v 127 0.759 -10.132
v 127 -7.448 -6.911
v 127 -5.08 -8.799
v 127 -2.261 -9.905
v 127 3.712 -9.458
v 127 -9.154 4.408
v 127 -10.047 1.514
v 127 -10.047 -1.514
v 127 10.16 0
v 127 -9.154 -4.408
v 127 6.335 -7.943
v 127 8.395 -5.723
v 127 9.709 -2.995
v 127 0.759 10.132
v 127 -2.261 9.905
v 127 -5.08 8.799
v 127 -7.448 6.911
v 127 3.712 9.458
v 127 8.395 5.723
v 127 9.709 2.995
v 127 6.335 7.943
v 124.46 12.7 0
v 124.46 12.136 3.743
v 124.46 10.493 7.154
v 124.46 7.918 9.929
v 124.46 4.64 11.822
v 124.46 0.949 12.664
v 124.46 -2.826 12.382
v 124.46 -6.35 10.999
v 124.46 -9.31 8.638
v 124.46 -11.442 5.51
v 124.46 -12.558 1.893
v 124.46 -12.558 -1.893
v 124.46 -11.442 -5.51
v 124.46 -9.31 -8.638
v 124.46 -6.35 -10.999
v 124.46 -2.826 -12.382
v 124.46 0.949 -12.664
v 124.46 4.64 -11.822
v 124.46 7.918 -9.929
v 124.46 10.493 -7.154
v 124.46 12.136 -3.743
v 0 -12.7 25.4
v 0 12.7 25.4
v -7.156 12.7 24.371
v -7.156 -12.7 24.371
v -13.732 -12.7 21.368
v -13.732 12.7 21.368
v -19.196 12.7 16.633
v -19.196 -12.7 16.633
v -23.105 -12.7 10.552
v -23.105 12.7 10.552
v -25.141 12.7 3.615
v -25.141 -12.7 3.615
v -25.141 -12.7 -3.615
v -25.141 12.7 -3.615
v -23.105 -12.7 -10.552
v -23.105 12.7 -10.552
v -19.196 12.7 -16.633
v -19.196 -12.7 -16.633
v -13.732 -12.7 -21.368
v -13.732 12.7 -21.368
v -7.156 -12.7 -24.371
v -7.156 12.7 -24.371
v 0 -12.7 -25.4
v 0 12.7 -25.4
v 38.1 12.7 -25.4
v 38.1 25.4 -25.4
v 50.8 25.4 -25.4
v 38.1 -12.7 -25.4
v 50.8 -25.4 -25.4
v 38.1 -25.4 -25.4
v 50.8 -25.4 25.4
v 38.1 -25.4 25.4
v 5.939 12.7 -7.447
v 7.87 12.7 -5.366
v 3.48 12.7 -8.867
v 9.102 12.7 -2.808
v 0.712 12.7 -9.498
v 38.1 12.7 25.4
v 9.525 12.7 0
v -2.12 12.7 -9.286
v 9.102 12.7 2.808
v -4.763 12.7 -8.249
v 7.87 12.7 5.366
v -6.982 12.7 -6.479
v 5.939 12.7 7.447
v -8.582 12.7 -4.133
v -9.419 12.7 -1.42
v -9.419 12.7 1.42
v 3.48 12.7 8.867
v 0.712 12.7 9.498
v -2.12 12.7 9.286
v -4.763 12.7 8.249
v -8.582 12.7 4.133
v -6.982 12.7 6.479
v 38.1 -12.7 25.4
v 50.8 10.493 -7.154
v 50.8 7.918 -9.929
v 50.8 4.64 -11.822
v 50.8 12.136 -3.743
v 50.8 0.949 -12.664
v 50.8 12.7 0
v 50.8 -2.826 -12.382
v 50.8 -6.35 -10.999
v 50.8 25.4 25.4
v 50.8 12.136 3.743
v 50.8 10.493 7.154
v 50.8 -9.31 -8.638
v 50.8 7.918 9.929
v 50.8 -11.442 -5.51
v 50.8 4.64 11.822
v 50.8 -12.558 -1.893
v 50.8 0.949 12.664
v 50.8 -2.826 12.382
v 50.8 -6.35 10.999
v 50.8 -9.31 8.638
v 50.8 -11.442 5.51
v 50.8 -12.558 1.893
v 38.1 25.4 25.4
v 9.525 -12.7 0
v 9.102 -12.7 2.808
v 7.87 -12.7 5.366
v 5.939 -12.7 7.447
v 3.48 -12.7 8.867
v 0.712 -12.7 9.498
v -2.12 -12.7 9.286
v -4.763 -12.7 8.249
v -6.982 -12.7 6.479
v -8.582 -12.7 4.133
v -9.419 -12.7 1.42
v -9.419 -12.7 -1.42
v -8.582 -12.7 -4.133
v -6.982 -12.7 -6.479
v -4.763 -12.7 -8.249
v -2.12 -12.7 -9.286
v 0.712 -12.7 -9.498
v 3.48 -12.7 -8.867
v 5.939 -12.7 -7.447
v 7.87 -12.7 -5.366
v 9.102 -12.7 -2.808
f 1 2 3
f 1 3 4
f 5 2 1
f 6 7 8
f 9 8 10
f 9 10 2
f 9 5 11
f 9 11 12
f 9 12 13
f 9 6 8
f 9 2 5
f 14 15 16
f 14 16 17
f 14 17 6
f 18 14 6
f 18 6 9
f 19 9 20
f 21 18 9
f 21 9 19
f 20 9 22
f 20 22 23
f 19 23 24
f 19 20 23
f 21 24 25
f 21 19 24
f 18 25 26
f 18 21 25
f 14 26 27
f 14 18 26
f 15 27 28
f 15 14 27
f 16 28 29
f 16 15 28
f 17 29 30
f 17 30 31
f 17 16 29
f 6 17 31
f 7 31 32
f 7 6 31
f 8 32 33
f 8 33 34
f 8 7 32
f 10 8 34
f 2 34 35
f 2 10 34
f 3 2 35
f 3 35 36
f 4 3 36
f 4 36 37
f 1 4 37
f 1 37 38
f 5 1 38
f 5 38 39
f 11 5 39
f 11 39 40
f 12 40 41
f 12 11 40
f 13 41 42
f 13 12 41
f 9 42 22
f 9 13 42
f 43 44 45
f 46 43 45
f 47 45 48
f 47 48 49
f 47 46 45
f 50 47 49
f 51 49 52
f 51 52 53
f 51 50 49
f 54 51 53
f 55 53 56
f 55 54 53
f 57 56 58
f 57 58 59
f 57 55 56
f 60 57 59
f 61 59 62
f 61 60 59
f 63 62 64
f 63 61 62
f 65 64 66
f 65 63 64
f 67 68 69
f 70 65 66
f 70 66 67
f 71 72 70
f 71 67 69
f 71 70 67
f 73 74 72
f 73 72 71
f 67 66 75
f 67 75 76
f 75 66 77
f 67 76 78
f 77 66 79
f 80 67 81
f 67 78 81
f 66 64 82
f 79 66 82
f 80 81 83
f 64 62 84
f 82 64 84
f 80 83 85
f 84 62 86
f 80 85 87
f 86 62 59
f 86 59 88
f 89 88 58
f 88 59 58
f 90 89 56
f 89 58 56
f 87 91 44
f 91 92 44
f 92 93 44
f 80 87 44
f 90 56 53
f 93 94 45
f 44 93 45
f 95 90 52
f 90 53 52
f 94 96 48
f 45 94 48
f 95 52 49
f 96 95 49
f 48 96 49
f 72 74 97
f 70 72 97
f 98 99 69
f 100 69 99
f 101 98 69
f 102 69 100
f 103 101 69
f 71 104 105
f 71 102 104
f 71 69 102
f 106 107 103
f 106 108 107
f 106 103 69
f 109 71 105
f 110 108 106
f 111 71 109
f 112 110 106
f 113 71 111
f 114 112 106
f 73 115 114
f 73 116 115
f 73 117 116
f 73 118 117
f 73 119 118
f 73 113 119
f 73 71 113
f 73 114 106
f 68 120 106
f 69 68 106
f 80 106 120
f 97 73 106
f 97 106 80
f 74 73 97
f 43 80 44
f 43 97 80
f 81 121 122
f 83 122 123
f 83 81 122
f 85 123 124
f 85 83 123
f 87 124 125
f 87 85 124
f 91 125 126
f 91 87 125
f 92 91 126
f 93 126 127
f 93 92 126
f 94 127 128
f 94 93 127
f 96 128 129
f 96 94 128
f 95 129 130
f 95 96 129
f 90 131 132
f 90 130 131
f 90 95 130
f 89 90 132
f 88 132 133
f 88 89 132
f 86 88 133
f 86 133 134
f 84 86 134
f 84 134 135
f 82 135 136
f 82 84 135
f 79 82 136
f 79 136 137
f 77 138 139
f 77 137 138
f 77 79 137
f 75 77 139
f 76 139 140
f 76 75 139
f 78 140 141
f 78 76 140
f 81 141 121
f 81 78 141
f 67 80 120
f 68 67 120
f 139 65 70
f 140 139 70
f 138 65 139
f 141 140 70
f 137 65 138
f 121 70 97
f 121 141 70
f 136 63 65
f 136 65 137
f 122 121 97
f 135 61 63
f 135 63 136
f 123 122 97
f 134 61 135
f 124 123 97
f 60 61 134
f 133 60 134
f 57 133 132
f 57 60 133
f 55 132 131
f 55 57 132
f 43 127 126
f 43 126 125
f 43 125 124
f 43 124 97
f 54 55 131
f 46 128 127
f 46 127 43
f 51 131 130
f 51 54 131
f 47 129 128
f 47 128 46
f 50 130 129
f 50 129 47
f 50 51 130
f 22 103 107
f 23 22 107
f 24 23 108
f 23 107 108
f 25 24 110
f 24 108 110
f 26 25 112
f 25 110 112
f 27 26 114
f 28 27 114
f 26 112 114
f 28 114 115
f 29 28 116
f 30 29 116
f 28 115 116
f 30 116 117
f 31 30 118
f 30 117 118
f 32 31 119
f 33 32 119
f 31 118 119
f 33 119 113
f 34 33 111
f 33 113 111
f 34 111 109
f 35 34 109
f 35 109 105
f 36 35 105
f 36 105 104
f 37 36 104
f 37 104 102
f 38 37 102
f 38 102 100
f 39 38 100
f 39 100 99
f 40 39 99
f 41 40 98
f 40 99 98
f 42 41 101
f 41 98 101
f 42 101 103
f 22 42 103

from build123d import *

# Parameters (mm, degrees)
F0_R     = 9.525
F1_DEPTH = 25.4
F2_W     = 12.7
F2_H     = 50.8
F3_DEPTH = 38.1
F4_DEPTH = 25.4
F5_R     = 12.7
F6_DEPTH = 76.2
F7_SIZE2 = 2.54
F7_SIZE  = 2.54


with BuildPart() as f1:
    # F0 (on Front) → F1 (new body, symmetric)
    with BuildSketch(Plane.XZ):
        with BuildLine():
            Line((50.8, 25.4), (0, 25.4))
            ThreePointArc((0, 25.4), (-25.4, 0), (0, -25.4))
            Line((0, -25.4), (50.8, -25.4))
            Line((50.8, -25.4), (50.8, 25.4))
        make_face()
        Circle(F0_R, mode=Mode.SUBTRACT)
    extrude(amount=F1_DEPTH, both=True)

    # F2 (on Right) → F3 (cut)
    with BuildSketch(Plane.YZ):
        with Locations((19.05, 0)):
            Rectangle(F2_W, F2_H)
        with Locations((-19.05, 0)):
            Rectangle(F2_W, F2_H)
    extrude(amount=F3_DEPTH, mode=Mode.SUBTRACT)

    # F2 (on Right) → F4 (cut)
    with BuildSketch(Plane.YZ):
        with Locations((19.05, 0)):
            Rectangle(F2_W, F2_H)
        with Locations((-19.05, 0)):
            Rectangle(F2_W, F2_H)
    extrude(amount=-F4_DEPTH, mode=Mode.SUBTRACT)

    # F5 (on face) → F6 (join)
    with BuildSketch(Plane.YZ.offset(50.8)):
        Circle(F5_R)
    extrude(amount=F6_DEPTH)

    # F7
    f7_edges = [f1.edges().sort_by_distance(p)[0] for p in [
        (127, -12.7, 0),
    ]]
    chamfer(f7_edges, length=F7_SIZE, length2=F7_SIZE2)


solid = f1.part
